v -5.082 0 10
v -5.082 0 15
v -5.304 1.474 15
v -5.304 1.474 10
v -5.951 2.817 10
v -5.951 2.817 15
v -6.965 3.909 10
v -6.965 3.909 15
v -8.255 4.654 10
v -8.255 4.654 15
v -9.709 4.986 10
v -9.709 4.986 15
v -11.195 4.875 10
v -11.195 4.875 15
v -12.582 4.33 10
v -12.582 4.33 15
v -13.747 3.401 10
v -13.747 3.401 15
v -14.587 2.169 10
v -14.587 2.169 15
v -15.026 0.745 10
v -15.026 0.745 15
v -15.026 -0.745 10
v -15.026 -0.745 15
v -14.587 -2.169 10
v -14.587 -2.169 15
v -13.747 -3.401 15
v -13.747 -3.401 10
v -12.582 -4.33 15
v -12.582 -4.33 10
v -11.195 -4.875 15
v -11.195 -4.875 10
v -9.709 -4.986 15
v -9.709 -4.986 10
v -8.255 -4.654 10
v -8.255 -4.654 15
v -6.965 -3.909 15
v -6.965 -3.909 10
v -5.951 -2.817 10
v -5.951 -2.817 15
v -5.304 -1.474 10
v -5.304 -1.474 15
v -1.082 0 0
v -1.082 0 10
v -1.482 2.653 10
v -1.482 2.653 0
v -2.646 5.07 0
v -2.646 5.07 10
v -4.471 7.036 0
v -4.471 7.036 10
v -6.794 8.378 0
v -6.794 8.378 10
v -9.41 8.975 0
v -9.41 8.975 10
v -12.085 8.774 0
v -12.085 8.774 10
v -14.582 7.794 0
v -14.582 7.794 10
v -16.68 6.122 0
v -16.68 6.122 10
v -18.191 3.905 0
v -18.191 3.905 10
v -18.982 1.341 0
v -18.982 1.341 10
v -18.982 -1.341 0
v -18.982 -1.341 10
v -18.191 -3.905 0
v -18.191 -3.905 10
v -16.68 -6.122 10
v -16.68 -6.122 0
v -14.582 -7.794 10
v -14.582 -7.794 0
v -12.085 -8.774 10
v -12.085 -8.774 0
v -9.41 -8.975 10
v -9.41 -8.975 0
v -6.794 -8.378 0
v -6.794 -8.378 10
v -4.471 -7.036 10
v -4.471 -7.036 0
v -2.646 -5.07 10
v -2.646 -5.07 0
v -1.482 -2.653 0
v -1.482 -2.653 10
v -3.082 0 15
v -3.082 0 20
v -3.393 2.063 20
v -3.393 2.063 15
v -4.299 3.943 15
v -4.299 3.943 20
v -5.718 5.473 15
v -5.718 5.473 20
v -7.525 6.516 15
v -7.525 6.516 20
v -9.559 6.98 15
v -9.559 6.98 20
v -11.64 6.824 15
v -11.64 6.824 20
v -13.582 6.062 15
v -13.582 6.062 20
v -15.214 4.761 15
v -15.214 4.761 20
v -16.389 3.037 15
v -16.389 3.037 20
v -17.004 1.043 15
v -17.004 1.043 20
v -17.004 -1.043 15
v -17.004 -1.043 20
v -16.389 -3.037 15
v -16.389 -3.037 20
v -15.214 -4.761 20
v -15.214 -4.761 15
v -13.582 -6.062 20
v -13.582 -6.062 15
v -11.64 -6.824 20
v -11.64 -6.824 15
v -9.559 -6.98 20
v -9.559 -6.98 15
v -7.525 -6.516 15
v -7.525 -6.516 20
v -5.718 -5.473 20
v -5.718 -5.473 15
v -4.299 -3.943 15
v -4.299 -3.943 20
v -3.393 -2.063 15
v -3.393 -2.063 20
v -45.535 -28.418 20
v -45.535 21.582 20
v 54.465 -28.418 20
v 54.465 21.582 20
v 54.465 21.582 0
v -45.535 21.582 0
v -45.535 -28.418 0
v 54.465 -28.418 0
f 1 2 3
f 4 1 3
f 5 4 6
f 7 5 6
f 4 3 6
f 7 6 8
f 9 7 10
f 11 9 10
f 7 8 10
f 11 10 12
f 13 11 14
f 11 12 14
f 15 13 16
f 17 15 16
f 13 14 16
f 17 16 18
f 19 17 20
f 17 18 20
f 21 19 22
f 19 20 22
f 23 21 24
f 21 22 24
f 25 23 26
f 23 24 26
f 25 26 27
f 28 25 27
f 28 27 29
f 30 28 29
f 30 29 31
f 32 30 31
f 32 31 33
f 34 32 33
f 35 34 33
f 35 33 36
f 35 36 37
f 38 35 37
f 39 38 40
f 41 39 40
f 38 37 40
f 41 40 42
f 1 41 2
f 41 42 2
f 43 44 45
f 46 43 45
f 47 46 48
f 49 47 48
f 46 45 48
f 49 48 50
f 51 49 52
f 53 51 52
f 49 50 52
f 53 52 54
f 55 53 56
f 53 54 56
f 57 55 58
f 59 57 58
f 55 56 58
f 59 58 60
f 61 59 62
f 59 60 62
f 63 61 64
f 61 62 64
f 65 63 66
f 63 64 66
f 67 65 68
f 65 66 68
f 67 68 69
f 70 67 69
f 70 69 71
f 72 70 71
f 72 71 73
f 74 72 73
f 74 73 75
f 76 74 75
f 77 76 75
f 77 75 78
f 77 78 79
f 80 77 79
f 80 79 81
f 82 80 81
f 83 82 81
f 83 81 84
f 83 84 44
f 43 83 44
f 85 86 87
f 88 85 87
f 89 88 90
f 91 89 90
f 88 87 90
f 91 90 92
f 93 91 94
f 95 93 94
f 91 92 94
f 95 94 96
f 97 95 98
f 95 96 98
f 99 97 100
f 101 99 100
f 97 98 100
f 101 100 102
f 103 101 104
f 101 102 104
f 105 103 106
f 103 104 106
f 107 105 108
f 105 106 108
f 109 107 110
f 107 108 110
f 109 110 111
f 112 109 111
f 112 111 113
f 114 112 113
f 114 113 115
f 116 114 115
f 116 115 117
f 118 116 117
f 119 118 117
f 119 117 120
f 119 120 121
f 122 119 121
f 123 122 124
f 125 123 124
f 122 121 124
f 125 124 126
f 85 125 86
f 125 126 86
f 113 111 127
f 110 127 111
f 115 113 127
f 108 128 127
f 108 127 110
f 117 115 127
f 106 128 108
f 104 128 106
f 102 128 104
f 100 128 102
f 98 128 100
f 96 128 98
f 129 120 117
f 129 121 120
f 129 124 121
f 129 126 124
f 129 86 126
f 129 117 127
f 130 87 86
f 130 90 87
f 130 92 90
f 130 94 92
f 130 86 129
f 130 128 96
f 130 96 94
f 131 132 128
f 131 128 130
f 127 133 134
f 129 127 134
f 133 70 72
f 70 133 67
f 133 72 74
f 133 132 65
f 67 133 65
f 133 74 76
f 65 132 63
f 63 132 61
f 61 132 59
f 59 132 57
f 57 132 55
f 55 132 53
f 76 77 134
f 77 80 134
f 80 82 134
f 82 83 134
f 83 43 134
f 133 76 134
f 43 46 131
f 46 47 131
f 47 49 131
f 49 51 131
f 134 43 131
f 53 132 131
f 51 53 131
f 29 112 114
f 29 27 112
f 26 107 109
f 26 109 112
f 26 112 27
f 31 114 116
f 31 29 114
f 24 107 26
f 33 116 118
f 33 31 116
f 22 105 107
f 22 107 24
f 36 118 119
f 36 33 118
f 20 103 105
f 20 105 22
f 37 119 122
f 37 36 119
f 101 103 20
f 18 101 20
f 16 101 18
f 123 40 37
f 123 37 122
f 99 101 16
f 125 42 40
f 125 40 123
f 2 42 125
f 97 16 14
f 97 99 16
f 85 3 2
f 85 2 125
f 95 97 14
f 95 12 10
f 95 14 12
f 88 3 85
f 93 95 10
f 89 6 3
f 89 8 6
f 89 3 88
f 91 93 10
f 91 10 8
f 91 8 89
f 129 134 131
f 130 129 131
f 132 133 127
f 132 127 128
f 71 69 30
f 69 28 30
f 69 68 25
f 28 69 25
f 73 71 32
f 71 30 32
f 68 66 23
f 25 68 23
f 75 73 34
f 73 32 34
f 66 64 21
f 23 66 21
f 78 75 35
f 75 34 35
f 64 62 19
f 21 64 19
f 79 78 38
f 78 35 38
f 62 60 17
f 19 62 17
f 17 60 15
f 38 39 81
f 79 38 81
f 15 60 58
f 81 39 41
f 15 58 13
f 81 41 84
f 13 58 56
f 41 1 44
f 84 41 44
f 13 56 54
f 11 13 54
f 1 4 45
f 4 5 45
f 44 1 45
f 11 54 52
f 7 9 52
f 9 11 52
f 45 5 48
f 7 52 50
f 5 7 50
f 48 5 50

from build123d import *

# Parameters (mm, degrees)
F0_W     = 100
F0_H     = 50
F1_DEPTH = 20
F2_R     = 7
F3_DEPTH = 5
F4_R     = 5
F5_DEPTH = 5
F6_R     = 9
F7_DEPTH = 25


with BuildPart() as f1:
    # F0 (on Top) → F1 (new body)
    with BuildSketch(Plane.XY):
        with Locations((4.46457, -3.417686)):
            Rectangle(F0_W, F0_H)
    extrude(amount=F1_DEPTH)

    # F2 (on face) → F3 (cut)
    with BuildSketch(Plane.XY.offset(20)):
        with Locations((-10.082174, 0)):
            Circle(F2_R)
    extrude(amount=-F3_DEPTH, mode=Mode.SUBTRACT)

    # F4 (on face) → F5 (cut)
    with BuildSketch(Plane.XY.offset(15)):
        with Locations((-10.082174, 0)):
            Circle(F4_R)
    extrude(amount=-F5_DEPTH, mode=Mode.SUBTRACT)

    # F6 (on face) → F7 (cut)
    with BuildSketch(Plane.XY.offset(10)):
        with Locations((-10.082174, 0)):
            Circle(F6_R)
    extrude(amount=-F7_DEPTH, mode=Mode.SUBTRACT)


solid = f1.part
